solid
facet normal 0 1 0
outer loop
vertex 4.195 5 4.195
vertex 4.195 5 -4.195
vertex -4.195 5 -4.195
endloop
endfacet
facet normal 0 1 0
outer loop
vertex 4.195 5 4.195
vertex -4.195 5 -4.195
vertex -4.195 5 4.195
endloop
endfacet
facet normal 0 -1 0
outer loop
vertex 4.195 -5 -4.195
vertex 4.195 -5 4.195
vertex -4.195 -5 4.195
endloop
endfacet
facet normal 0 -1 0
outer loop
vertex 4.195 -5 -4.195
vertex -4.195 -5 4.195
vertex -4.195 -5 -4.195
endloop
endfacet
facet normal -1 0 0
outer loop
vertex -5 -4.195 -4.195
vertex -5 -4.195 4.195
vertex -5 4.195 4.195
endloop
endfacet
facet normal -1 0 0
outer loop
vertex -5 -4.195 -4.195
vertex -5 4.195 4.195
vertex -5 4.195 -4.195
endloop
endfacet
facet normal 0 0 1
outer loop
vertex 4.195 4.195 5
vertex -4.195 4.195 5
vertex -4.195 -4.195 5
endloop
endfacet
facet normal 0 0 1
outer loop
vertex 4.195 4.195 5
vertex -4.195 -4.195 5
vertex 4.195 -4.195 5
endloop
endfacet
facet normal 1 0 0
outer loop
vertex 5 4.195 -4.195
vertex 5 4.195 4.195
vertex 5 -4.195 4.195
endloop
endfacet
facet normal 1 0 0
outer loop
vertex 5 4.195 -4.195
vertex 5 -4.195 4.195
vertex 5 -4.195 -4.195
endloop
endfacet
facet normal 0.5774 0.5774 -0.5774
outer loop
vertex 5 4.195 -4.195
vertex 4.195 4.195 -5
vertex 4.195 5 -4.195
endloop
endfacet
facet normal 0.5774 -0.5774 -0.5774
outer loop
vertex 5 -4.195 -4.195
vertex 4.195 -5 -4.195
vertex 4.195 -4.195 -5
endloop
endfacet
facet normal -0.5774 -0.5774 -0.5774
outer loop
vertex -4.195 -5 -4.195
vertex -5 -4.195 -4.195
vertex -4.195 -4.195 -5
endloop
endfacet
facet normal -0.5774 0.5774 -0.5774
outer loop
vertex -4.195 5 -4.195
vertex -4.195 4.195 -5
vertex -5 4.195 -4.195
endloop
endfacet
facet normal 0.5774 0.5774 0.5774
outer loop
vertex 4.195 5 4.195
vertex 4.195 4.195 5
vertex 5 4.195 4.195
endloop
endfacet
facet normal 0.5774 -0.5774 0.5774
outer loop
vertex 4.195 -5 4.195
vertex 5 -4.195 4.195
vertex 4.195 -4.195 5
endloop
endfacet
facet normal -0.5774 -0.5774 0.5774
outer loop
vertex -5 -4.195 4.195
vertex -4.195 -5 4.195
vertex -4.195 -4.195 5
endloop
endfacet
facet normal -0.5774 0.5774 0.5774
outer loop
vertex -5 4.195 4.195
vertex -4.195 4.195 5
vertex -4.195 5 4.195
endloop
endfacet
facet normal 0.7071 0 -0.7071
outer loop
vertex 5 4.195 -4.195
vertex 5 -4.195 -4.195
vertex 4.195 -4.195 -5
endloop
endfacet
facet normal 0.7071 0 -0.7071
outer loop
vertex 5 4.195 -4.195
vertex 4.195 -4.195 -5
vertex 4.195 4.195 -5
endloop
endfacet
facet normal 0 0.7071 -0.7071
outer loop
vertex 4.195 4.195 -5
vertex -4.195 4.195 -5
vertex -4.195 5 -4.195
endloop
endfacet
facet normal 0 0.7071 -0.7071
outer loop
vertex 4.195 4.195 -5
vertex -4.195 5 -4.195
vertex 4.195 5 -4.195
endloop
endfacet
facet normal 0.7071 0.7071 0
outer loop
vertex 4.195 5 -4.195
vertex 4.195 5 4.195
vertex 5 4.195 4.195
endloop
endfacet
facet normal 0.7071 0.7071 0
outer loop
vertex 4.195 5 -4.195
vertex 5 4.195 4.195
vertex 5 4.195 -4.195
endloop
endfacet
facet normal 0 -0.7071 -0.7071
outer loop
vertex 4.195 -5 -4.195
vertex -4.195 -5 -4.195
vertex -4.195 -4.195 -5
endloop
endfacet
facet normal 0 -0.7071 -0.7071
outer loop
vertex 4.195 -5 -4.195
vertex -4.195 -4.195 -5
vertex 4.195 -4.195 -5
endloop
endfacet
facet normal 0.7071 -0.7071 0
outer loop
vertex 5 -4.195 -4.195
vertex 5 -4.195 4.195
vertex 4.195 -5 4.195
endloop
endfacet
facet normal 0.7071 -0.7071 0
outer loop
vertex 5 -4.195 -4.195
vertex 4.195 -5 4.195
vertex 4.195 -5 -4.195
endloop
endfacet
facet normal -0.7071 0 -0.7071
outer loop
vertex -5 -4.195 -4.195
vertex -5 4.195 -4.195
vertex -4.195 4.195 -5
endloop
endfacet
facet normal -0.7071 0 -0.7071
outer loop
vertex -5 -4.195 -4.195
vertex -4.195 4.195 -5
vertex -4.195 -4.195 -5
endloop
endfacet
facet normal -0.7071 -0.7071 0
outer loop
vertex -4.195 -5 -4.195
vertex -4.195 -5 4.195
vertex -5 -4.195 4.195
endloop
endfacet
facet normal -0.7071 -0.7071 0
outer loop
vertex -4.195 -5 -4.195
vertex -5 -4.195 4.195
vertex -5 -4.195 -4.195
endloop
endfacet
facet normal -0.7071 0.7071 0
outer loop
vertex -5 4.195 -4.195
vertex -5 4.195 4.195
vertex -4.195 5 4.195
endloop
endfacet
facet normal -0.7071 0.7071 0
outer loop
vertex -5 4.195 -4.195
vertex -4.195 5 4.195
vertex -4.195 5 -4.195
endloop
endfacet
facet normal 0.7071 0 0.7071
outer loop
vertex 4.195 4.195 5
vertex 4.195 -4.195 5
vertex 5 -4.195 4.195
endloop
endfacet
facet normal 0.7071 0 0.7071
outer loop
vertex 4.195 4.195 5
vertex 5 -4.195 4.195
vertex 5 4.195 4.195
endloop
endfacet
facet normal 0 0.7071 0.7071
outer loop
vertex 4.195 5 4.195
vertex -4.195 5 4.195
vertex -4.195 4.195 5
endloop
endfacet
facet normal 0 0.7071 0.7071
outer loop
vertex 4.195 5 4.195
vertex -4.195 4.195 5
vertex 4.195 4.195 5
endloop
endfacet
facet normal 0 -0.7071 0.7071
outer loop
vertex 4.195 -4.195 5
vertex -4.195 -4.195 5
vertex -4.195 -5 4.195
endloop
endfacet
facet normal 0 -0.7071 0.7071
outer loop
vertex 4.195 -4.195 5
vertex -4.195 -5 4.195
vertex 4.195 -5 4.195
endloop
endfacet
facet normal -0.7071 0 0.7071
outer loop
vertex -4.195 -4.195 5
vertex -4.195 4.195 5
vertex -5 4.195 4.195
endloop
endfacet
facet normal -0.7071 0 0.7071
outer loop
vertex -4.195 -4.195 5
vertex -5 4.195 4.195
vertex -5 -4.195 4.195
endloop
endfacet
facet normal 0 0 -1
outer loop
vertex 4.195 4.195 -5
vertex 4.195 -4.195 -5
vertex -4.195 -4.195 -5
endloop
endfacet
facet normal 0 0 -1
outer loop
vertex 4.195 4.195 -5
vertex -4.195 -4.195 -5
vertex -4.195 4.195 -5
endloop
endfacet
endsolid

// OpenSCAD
//Cube dimensions in mm
x=10;//[1:200]

scale([x/2,x/2,x/2]) Cube();

// Functions and Utilities
function Cube_dimX() = 2.00;
function Cube_dimY() = 2.00;
function Cube_dimZ() = 2.00;
function Cube_multmatrix() = [[1.000000,0.000000,0.000000,0.000000],[0.000000,1.000000,0.000000,0.000000],[0.000000,0.000000,1.000000,0.000000],[0.000000,0.000000,0.000000,1.000000]];

/////////////////////
// geometry for Cube
function Cube_faces() = [
[9,2,12],[23,9,12],[19,15,4],[6,19,4],[21,18,7],[11,21,7],[20,22,13],[17,20,13],[16,14,0],[3,16,0],[2,1,0],[5,4,3],[8,7,6],[11,10,9],[14,13,12],[17,16,15],[20,19,18],[23,22,21],[5,3,0],[1,5,0],[9,10,1],[2,9,1],[14,12,2],[0,14,2],[8,6,4],[5,8,4],[15,16,3],[4,15,3],[10,11,7],[8,10,7],[18,19,6],[7,18,6],[23,21,11],[9,23,11],[16,17,13],[14,16,13],[22,23,12],[13,22,12],[19,20,17],[15,19,17],[21,22,20],[18,21,20],[8,5,1],[10,8,1]];
function Cube_points() = [
[1.000000,0.839000,-0.839000],[0.839000,0.839000,-1.000000],[0.839000,1.000000,-0.839000],[1.000000,-0.839000,-0.839000],[0.839000,-1.000000,-0.839000],[0.839000,-0.839000,-1.000000],[-0.839000,-1.000000,-0.839000],[-1.000000,-0.839000,-0.839000],[-0.839000,-0.839000,-1.000000],[-0.839000,1.000000,-0.839000],[-0.839000,0.839000,-1.000000],[-1.000000,0.839000,-0.839000],[0.839000,1.000000,0.839000],[0.839000,0.839000,1.000000],[1.000000,0.839000,0.839000],[0.838999,-1.000000,0.839000],[1.000000,-0.839001,0.839000],[0.838999,-0.839000,1.000000],[-1.000000,-0.839000,0.839000],[-0.839000,-1.000000,0.839000],[-0.839000,-0.839000,1.000000],[-1.000000,0.839000,0.839000],[-0.839000,0.839000,1.000000],[-0.839000,1.000000,0.839000]];module Cube() {
    multmatrix(Cube_multmatrix()) polyhedron(faces = Cube_faces(), points = Cube_points(), convexity=10);
};
